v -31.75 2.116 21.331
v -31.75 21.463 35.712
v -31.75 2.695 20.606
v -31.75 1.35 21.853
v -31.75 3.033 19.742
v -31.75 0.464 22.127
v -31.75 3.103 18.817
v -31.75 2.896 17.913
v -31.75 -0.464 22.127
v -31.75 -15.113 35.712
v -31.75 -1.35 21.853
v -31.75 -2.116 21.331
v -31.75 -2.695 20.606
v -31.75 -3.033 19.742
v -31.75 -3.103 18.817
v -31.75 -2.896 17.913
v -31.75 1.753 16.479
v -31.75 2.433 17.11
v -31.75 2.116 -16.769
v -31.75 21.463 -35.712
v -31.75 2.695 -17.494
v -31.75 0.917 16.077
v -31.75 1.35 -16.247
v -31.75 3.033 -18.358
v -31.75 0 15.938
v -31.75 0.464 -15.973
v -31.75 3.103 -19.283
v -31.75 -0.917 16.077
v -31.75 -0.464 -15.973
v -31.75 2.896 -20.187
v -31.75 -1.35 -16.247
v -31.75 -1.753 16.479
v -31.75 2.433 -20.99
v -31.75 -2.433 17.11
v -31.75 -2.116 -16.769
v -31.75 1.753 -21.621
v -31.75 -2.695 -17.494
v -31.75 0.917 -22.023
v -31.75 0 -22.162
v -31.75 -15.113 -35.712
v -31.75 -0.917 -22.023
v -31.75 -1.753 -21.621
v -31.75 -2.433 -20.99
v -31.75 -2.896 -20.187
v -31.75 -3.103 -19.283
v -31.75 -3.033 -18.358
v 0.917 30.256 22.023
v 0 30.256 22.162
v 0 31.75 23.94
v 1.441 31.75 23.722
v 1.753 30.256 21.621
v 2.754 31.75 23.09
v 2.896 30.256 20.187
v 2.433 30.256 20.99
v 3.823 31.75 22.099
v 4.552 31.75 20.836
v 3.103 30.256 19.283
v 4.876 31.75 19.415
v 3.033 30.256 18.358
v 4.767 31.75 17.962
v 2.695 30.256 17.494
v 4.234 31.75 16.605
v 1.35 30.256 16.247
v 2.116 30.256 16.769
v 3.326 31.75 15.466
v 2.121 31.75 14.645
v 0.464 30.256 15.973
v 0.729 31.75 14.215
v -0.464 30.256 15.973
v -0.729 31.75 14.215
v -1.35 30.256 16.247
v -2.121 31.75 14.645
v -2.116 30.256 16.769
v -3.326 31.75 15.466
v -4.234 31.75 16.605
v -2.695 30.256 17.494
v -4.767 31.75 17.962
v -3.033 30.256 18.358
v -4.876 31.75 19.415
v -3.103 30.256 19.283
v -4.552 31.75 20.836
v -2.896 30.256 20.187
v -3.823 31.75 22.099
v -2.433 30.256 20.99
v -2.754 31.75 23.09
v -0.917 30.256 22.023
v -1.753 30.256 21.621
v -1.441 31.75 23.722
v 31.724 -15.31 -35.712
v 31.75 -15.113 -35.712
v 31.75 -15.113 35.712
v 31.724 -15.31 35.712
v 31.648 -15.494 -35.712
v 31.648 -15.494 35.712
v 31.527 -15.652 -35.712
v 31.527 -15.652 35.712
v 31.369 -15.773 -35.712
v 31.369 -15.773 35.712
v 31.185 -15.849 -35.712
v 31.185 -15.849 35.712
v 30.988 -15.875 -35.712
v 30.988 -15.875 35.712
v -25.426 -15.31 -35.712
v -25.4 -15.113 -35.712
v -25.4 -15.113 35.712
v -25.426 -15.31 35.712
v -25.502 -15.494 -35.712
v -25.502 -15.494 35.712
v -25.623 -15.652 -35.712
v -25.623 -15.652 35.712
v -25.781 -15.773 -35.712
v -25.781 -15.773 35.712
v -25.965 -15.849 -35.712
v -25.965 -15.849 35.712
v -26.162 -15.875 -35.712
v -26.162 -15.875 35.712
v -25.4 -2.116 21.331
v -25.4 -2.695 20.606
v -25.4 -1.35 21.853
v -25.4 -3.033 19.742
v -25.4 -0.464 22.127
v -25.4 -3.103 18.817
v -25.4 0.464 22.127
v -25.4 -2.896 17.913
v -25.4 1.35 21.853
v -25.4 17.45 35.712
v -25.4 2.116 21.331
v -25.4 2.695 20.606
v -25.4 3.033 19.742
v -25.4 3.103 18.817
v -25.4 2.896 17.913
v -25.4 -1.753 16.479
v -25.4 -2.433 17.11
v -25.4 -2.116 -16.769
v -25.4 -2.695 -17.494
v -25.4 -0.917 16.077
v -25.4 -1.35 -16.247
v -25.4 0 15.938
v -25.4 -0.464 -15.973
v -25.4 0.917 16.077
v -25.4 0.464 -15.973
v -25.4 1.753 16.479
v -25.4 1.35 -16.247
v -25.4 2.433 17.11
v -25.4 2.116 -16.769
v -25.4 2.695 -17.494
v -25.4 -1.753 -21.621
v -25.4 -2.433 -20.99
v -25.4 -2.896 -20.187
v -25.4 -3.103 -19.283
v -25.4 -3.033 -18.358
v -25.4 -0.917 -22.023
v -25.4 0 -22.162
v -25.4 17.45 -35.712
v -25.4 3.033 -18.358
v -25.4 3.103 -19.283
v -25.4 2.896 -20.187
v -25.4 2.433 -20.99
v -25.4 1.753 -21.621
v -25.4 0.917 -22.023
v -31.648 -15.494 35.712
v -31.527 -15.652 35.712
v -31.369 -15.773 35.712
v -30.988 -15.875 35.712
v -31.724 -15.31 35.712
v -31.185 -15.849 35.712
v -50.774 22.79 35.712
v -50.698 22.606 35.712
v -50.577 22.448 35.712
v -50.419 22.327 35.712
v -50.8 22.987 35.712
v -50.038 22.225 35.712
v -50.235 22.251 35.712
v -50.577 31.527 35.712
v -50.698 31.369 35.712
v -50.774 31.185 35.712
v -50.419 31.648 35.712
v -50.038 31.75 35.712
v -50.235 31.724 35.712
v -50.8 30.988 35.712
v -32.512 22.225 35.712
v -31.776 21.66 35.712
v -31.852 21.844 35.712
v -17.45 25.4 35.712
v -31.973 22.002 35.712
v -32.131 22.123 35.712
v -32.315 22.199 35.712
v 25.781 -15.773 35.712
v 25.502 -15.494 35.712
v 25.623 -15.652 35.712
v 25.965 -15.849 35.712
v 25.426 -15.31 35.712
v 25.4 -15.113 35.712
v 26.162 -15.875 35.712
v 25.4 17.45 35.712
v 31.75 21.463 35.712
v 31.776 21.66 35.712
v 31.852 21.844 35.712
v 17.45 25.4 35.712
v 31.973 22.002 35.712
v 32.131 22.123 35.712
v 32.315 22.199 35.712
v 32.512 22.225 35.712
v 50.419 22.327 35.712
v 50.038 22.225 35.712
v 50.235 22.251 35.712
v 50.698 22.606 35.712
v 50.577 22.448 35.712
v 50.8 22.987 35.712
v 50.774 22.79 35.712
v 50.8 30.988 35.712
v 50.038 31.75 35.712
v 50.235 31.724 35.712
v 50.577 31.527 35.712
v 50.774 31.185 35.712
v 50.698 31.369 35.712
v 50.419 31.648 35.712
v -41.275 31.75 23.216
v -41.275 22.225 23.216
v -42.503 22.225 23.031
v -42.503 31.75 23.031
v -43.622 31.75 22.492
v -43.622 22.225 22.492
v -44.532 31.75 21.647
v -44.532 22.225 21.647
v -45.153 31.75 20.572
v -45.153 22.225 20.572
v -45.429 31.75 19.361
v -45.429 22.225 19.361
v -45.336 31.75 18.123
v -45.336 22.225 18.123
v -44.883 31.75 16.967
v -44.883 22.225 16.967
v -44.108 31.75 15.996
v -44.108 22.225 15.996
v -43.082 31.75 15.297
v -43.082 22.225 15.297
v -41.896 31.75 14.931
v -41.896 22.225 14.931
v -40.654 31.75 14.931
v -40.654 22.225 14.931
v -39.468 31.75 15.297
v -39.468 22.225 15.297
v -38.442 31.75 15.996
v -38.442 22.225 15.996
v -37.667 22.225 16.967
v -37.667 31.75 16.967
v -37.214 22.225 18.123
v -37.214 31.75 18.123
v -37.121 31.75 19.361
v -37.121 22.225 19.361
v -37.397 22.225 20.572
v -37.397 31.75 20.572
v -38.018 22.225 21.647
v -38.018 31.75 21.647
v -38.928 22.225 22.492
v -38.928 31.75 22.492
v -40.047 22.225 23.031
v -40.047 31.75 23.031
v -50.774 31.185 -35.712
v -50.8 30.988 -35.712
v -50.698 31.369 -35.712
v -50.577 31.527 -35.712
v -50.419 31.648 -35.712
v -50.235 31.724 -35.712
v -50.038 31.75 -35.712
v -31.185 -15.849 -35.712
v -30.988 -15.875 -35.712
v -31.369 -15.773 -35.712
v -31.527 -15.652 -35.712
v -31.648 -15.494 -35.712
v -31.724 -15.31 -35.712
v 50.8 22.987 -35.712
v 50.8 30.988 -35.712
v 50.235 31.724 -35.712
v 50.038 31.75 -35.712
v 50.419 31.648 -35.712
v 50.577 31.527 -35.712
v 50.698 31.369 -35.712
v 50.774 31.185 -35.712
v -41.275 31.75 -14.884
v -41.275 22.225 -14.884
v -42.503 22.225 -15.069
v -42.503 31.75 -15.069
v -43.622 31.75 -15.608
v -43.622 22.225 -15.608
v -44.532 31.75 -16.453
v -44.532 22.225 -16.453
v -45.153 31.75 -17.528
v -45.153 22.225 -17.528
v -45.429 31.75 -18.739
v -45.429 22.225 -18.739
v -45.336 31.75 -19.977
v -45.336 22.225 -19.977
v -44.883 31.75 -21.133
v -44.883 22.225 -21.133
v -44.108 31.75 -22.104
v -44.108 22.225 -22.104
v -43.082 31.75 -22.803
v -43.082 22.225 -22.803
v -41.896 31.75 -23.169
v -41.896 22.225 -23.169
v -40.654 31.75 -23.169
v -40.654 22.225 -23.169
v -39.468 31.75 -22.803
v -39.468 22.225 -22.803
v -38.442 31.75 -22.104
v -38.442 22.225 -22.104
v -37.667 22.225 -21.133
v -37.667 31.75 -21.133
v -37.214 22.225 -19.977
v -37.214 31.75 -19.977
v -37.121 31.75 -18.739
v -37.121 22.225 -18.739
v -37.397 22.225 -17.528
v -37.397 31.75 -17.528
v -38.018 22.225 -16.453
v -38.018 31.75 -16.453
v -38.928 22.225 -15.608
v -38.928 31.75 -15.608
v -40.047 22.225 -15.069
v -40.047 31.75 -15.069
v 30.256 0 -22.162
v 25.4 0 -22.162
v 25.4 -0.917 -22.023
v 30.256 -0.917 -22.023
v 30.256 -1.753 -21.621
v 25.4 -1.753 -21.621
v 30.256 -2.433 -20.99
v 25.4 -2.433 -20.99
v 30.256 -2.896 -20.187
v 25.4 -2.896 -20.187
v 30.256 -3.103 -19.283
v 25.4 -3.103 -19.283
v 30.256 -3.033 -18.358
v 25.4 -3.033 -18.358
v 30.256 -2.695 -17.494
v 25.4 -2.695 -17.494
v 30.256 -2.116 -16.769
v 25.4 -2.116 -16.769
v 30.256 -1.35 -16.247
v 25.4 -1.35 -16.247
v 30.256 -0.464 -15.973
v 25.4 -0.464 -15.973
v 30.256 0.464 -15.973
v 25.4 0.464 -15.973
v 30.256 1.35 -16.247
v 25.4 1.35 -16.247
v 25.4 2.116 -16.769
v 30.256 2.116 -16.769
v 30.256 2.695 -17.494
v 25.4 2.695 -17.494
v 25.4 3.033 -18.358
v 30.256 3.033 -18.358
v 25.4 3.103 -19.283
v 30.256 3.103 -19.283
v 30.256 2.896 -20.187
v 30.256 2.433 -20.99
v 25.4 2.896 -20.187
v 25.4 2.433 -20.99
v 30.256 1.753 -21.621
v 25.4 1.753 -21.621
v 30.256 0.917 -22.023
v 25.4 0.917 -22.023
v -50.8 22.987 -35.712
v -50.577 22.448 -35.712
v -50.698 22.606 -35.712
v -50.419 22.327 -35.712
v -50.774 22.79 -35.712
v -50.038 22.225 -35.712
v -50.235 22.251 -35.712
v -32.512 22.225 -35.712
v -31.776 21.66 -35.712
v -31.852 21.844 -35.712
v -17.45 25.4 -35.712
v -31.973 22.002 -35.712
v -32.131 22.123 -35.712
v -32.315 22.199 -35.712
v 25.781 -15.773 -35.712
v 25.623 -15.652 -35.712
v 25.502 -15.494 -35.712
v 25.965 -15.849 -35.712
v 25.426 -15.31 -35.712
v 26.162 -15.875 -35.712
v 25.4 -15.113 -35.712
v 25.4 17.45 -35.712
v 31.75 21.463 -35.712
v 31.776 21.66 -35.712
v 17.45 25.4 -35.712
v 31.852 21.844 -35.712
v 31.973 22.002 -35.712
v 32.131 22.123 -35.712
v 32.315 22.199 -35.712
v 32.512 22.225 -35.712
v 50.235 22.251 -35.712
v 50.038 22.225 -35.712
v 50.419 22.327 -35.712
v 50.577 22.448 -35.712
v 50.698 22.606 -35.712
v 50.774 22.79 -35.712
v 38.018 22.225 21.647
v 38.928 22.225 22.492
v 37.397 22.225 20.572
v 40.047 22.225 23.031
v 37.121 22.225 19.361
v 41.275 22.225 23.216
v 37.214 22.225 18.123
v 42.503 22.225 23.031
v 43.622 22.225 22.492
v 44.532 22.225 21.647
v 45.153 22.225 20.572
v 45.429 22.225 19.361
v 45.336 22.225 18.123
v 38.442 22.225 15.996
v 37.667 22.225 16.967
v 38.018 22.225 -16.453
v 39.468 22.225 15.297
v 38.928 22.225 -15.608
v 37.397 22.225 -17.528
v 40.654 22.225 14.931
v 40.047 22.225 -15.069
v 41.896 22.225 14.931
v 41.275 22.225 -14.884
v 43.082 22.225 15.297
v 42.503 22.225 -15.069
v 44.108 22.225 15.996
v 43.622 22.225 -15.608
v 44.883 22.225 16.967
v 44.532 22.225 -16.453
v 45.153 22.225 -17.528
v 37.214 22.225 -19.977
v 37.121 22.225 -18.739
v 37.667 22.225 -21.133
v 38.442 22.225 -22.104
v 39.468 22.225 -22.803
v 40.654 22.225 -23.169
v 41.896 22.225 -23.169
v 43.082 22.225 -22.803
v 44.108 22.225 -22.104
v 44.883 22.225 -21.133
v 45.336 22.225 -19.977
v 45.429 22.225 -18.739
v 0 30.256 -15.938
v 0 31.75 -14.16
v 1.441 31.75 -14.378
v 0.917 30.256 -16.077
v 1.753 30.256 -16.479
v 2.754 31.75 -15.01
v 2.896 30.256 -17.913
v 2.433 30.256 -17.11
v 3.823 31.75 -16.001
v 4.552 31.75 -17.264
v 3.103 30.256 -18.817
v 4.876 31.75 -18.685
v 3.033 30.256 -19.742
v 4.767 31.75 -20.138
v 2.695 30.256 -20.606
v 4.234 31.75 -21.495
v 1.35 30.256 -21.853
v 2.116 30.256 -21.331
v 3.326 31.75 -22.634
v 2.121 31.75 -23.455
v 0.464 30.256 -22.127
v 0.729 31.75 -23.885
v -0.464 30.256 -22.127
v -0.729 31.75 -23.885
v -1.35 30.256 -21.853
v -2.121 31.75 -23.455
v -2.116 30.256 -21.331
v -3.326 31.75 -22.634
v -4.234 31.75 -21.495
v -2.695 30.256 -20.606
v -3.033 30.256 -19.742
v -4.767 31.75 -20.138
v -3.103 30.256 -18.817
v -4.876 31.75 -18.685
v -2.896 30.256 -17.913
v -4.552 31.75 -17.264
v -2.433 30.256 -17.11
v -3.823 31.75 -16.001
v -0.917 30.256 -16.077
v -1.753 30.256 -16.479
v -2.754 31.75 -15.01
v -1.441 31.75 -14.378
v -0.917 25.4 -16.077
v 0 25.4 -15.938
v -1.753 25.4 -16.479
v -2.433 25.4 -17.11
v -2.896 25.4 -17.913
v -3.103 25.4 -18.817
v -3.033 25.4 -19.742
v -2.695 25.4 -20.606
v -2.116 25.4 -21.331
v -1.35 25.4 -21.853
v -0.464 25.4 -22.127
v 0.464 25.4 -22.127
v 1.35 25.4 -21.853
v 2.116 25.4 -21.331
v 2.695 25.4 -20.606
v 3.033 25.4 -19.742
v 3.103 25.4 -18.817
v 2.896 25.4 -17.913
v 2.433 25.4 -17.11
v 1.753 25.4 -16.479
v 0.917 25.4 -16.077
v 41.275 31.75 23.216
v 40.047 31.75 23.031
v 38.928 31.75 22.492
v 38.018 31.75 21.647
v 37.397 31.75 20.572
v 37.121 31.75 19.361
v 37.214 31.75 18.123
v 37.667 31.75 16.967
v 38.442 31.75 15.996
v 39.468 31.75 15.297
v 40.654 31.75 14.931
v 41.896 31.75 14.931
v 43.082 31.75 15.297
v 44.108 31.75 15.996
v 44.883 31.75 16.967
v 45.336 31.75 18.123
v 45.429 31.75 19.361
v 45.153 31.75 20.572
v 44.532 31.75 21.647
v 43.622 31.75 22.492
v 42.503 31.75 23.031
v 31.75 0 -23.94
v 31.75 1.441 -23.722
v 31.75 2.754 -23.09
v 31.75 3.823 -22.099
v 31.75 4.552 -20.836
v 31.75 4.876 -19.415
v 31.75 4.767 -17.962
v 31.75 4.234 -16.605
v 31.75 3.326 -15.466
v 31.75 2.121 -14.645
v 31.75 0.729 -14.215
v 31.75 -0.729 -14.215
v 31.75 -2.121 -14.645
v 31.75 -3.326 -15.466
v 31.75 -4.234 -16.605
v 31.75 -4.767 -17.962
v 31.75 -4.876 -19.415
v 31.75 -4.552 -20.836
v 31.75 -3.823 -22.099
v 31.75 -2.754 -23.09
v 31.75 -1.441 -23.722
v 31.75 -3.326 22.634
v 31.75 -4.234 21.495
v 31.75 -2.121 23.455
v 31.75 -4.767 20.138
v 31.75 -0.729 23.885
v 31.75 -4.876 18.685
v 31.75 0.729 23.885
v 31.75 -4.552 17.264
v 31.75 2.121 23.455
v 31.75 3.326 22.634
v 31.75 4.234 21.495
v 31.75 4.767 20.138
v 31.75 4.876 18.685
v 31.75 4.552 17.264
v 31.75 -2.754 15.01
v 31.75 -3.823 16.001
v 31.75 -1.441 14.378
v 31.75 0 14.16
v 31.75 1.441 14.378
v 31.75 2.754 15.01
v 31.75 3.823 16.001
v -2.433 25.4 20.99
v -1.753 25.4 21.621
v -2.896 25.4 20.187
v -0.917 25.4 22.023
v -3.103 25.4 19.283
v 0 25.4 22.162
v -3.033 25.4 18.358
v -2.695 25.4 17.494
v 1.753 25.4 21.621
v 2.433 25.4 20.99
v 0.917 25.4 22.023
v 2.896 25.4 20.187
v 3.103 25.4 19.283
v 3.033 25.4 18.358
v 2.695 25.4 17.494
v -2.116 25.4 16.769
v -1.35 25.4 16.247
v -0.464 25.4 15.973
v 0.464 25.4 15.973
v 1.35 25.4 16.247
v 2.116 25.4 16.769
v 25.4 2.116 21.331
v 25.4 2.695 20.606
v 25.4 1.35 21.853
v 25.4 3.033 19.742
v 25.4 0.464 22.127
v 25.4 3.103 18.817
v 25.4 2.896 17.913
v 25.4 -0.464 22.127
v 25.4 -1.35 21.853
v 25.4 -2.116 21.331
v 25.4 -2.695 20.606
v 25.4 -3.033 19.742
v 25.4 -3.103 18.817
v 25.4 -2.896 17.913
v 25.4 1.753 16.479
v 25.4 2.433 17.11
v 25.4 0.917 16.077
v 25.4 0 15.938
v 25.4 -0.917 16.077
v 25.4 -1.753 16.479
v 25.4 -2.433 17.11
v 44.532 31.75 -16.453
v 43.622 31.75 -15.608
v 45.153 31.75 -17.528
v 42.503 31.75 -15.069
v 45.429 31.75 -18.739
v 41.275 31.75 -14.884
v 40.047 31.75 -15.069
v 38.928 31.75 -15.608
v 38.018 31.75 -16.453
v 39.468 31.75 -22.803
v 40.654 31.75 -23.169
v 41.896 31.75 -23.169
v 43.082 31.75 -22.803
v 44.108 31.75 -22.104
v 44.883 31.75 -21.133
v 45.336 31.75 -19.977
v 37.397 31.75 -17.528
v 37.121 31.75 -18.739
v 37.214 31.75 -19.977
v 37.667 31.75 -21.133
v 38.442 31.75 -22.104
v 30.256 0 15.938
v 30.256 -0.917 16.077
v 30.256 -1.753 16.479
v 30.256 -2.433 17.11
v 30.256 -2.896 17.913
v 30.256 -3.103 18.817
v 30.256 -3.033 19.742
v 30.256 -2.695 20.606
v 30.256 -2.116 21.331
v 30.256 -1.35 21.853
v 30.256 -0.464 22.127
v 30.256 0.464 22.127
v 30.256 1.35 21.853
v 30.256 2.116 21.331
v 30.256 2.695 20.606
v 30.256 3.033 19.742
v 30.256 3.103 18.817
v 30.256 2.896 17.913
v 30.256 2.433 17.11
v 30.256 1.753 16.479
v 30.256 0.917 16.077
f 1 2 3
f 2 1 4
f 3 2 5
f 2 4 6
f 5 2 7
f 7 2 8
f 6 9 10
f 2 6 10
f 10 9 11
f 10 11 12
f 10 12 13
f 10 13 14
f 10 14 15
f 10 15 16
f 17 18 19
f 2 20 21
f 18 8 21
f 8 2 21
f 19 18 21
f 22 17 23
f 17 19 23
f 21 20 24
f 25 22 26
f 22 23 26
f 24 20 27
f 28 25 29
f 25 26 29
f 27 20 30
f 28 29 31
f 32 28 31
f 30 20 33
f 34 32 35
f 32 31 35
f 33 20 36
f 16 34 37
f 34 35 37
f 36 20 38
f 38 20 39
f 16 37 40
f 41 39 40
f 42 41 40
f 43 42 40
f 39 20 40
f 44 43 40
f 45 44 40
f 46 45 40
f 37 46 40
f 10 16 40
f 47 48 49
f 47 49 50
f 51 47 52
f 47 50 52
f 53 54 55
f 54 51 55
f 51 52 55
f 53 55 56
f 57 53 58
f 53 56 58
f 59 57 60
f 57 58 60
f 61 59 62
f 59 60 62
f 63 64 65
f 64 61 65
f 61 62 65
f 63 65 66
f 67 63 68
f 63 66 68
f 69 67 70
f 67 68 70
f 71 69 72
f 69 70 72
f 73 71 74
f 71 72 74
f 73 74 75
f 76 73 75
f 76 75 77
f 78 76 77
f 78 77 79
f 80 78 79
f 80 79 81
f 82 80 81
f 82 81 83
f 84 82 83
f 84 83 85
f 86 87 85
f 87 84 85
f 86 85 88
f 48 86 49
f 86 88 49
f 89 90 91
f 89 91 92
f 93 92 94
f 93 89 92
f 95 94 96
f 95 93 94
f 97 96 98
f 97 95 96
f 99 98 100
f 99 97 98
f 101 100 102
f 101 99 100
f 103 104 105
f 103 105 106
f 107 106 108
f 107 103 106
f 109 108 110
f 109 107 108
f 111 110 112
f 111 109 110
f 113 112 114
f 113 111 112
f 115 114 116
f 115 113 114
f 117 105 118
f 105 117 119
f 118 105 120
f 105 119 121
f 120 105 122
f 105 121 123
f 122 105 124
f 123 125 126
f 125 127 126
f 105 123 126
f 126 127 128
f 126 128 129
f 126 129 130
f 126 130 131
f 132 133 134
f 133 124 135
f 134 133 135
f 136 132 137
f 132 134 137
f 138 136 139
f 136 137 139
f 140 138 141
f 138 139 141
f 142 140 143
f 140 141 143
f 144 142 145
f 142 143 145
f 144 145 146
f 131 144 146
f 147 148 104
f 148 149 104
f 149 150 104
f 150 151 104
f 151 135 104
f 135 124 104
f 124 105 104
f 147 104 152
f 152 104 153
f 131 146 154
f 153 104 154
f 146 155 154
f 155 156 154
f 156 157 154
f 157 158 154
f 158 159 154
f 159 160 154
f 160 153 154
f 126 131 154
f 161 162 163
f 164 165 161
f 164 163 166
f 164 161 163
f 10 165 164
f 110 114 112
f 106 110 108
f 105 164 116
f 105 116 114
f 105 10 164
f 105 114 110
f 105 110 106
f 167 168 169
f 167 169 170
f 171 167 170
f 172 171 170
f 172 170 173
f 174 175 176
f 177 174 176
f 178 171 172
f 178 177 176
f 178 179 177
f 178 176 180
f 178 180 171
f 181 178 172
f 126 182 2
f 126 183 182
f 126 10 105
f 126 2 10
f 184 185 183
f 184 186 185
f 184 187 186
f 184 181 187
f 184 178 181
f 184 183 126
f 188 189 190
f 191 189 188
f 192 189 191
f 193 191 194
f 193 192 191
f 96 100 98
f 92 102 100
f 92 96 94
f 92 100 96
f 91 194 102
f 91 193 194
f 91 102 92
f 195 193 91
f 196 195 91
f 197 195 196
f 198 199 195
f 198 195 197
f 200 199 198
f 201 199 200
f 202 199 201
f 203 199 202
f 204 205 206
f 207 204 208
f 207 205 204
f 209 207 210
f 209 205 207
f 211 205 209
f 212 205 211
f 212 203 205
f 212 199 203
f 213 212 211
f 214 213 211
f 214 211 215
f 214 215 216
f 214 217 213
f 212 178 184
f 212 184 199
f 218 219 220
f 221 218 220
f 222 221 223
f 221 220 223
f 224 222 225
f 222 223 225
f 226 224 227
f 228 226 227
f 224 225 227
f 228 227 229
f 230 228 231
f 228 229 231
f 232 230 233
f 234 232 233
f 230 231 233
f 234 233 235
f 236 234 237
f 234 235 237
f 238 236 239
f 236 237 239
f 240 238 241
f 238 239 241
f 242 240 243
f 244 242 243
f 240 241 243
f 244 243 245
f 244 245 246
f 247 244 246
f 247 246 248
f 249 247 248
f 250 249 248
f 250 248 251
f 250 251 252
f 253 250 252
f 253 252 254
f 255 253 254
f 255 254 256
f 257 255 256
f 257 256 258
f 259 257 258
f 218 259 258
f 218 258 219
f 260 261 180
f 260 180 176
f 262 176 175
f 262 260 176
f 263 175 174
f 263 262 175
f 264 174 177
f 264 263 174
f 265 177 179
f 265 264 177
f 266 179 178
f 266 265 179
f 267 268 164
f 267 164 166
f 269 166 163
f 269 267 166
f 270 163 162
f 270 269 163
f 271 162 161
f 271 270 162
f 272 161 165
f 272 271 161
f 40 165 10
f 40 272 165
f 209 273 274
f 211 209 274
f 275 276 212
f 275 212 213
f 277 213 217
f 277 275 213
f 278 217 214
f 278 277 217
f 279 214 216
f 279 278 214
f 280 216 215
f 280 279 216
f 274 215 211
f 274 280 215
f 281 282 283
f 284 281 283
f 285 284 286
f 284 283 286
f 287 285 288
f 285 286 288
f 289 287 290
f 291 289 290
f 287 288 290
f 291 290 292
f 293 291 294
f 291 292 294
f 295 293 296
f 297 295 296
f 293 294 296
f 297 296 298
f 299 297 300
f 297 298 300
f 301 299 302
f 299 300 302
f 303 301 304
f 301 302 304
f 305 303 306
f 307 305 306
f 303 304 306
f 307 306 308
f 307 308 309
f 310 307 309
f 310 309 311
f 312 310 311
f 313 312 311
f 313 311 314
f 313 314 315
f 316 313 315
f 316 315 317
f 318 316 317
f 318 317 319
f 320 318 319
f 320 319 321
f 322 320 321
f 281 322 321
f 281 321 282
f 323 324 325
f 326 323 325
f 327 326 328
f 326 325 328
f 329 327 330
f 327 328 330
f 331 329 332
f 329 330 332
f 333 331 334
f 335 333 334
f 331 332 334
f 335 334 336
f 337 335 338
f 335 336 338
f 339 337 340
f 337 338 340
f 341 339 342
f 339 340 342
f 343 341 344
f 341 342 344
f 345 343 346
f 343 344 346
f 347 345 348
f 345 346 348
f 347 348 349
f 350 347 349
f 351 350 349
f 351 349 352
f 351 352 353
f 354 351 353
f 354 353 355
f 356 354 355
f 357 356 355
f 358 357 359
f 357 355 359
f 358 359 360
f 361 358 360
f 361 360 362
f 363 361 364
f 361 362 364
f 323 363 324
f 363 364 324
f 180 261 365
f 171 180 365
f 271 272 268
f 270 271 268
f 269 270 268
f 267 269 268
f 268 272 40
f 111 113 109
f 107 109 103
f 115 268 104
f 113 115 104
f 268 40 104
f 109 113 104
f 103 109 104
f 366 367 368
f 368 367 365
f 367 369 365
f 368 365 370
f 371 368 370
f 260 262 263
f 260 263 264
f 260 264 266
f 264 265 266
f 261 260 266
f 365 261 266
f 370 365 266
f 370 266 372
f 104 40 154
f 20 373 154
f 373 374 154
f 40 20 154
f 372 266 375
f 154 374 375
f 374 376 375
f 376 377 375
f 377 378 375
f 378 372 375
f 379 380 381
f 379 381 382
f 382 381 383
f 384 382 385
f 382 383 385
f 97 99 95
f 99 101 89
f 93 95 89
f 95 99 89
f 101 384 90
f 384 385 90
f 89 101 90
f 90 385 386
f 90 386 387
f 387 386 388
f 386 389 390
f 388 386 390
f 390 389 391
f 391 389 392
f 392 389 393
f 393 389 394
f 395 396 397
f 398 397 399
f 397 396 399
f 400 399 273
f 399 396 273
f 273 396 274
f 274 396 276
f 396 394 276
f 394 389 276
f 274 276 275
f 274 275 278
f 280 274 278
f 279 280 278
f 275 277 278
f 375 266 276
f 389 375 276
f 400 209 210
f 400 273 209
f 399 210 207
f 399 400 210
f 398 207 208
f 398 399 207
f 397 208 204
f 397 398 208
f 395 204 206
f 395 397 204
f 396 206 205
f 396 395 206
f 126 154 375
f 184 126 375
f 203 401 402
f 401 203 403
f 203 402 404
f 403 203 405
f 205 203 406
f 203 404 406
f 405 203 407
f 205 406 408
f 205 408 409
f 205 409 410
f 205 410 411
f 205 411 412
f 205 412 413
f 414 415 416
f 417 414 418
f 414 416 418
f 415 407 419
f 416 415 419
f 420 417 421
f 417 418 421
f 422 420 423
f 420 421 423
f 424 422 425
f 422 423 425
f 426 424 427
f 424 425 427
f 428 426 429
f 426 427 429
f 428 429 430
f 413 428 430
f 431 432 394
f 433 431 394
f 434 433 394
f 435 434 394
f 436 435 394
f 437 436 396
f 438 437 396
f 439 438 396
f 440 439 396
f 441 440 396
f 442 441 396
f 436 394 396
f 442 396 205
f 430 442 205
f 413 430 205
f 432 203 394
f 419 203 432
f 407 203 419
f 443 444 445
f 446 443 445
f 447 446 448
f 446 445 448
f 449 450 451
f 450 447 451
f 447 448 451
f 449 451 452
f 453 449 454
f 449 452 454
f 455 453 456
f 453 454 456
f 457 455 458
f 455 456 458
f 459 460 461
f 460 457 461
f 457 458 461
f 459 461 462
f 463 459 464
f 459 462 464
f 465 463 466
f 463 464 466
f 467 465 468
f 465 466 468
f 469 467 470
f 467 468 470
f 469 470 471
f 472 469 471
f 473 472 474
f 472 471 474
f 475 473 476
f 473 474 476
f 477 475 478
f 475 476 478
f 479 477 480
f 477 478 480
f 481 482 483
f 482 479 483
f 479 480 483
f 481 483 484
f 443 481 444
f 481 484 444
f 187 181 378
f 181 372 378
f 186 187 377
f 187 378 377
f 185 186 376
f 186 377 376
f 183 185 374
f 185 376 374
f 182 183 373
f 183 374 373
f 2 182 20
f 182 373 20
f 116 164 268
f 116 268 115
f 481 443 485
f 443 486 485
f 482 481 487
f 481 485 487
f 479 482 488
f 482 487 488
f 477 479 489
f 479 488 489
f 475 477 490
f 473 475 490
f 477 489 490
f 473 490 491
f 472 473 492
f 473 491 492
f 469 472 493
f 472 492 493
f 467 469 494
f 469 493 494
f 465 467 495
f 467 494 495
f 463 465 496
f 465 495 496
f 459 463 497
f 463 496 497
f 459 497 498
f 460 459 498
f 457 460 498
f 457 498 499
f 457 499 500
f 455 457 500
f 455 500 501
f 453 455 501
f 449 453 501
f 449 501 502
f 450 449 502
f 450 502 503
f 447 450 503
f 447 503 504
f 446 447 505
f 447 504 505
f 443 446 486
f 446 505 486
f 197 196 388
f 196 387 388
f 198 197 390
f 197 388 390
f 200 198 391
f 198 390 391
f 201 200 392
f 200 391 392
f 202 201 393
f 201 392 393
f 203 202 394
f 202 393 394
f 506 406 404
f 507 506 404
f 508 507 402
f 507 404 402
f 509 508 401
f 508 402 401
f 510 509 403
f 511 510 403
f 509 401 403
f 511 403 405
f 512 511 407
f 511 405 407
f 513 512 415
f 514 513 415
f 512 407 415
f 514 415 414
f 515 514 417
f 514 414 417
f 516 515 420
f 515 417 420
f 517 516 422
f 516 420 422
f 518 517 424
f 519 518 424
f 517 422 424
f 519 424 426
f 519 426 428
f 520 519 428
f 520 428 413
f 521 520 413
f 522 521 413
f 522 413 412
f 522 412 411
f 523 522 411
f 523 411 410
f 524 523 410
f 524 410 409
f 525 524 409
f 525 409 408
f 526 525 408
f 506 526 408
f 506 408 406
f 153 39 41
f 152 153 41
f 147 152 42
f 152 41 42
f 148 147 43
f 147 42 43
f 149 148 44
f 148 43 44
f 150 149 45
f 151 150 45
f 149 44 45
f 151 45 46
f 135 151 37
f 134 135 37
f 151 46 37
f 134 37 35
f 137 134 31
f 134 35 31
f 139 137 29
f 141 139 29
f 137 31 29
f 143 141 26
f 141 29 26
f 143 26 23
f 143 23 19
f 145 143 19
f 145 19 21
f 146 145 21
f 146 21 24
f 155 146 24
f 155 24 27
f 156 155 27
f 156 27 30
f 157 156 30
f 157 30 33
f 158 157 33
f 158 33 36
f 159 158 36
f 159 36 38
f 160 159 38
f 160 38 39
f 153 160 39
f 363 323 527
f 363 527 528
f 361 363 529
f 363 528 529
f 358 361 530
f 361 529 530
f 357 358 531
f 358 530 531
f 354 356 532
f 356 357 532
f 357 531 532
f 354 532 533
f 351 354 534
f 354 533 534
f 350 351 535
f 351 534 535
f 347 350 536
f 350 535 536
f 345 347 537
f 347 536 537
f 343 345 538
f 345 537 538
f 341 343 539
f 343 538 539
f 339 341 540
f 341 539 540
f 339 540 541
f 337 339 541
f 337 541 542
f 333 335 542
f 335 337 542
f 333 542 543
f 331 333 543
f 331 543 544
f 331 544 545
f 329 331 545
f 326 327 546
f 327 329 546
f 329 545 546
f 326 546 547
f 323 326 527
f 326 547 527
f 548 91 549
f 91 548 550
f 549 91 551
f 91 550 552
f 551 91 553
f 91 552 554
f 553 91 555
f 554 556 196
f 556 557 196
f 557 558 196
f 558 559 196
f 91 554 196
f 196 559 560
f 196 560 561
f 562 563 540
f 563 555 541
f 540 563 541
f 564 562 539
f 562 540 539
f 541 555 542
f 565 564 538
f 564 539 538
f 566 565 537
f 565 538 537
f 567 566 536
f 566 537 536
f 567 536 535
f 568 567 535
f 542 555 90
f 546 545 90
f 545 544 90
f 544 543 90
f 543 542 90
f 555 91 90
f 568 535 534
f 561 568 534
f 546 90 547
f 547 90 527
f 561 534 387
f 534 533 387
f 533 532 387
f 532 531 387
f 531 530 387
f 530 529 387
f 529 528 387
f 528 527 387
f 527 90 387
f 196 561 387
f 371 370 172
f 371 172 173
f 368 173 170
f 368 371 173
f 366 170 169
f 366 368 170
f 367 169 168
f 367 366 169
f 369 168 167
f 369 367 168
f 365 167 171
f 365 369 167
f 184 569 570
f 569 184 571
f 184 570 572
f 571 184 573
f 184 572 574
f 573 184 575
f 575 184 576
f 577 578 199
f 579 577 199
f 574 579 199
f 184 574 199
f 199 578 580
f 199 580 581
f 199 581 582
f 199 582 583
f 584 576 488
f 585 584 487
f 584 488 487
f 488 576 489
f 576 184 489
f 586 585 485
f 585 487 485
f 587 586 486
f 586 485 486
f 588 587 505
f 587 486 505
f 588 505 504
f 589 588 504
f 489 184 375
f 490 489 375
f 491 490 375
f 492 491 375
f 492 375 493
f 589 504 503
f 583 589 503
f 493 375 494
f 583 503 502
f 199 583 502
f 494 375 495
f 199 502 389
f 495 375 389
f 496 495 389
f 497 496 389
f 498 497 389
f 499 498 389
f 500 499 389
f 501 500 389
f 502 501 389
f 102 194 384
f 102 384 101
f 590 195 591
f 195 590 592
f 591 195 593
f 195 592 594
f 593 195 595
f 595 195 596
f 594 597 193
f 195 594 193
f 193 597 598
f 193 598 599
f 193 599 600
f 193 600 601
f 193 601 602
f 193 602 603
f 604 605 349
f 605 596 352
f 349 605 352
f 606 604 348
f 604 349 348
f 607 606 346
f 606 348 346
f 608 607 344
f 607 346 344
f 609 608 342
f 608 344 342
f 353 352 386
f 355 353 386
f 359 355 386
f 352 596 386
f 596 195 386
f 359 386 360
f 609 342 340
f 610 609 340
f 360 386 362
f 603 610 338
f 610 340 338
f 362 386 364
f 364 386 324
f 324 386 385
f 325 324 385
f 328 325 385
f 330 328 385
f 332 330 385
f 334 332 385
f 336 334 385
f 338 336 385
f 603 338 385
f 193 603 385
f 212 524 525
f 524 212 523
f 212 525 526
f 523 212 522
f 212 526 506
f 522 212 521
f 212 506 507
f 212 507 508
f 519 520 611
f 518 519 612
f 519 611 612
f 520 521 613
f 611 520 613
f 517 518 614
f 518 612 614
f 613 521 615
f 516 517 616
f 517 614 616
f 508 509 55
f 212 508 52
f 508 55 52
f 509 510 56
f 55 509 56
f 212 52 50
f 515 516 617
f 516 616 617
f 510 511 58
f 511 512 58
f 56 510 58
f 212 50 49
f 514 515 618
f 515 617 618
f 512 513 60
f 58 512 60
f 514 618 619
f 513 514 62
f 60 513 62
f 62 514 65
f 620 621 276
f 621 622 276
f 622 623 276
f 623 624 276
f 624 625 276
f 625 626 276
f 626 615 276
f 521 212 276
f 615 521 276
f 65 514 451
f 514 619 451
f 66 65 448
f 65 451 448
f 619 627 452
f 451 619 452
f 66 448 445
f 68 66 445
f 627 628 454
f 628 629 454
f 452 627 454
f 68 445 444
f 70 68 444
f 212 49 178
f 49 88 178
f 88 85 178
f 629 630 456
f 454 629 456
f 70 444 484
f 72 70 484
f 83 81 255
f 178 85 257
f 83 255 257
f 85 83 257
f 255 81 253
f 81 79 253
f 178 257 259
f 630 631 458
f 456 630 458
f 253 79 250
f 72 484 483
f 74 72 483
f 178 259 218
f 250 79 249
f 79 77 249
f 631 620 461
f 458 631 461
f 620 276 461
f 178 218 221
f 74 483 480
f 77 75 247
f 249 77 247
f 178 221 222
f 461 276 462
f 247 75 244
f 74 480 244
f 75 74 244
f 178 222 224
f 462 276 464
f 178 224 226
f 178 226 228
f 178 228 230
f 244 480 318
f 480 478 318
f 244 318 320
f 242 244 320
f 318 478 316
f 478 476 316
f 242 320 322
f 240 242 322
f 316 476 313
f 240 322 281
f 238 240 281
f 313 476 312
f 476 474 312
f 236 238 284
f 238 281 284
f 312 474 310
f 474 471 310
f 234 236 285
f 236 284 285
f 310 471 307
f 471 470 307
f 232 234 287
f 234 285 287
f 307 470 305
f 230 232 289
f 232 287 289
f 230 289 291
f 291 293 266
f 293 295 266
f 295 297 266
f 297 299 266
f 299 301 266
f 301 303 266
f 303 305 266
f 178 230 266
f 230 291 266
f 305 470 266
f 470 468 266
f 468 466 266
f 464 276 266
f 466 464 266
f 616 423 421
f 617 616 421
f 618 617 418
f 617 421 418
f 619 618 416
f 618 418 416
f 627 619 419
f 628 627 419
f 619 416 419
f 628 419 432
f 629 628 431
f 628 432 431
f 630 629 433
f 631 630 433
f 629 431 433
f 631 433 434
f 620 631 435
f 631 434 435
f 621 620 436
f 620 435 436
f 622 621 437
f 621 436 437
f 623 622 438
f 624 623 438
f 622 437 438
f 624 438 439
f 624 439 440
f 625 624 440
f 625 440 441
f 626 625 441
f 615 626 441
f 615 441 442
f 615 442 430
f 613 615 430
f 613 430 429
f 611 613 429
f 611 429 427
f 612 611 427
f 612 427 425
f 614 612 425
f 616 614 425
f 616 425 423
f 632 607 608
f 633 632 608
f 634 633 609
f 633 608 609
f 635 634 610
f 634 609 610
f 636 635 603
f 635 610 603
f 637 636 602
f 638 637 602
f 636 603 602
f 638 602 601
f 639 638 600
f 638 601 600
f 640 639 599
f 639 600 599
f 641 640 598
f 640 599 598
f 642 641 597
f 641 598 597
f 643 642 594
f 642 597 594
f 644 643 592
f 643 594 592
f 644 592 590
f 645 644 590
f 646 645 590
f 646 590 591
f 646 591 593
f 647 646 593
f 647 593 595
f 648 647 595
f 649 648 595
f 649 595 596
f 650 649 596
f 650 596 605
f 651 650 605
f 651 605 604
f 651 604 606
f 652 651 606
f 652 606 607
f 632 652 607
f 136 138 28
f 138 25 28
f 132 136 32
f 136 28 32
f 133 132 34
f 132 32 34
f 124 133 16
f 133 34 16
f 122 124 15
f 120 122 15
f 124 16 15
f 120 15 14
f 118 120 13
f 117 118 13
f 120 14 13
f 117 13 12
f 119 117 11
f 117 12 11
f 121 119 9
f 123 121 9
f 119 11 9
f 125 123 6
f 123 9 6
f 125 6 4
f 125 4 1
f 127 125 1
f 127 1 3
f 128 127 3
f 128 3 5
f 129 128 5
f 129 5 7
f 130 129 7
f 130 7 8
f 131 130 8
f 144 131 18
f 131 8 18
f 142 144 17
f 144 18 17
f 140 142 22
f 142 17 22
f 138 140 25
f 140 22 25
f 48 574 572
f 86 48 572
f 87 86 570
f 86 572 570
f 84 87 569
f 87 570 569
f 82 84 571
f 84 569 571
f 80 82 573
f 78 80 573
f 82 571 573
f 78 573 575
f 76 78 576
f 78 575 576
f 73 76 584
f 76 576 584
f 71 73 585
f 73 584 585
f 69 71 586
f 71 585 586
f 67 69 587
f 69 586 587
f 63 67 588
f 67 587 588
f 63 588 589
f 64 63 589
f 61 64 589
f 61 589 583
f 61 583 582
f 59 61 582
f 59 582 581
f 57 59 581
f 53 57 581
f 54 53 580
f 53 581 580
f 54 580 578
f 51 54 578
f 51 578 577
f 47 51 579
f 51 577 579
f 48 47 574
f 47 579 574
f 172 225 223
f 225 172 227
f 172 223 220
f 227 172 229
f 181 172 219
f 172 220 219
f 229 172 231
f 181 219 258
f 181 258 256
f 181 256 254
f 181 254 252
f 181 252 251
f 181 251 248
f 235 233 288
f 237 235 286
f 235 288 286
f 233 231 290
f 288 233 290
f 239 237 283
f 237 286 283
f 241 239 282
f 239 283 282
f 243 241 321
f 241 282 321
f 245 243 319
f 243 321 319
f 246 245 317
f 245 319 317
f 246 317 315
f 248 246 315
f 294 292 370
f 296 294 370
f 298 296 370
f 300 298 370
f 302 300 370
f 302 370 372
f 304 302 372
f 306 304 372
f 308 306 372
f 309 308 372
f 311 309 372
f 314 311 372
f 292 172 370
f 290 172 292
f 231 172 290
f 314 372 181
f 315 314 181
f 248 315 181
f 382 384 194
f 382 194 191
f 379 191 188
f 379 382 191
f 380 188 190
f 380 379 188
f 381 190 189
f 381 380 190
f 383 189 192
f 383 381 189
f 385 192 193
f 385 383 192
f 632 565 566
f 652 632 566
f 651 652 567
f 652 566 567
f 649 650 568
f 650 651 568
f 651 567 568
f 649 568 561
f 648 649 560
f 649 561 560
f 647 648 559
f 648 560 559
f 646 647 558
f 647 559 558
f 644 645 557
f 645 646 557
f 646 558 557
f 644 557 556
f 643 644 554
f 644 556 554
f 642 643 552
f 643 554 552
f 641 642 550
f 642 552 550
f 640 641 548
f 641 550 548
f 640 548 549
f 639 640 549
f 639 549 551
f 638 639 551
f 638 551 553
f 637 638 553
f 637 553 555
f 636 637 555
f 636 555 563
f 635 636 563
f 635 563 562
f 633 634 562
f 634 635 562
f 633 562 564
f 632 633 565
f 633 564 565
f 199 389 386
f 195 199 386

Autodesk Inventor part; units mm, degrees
sketch "Sketch_1" plane through (0, 0, 0) normal (0, 0, 1) x (1, 0, 0)
  line L0 (-50.8, 30.988) -> (-50.8, 22.987)
  arc A0 (-50.8, 22.987) -> (-50.038, 22.225) centre (-50.038, 22.987) ccw
  line L1 (-50.038, 22.225) -> (-32.512, 22.225)
  arc A1 (-31.75, 21.463) -> (-32.512, 22.225) centre (-32.512, 21.463) ccw
  line L2 (-31.75, 21.463) -> (-31.75, -15.113)
  arc A2 (-31.75, -15.113) -> (-30.988, -15.875) centre (-30.988, -15.113) ccw
  line L3 (-30.988, -15.875) -> (-26.162, -15.875)
  arc A3 (-26.162, -15.875) -> (-25.4, -15.113) centre (-26.162, -15.113) ccw
  line L4 (-25.4, -15.113) -> (-25.4, 17.4498)
  line L5 (-25.4, 17.4498) -> (-17.4498, 25.4)
  line L6 (-17.4498, 25.4) -> (17.4498, 25.4)
  line L7 (17.4498, 25.4) -> (25.4, 17.4498)
  line L8 (25.4, 17.4498) -> (25.4, -15.113)
  arc A4 (25.4, -15.113) -> (26.162, -15.875) centre (26.162, -15.113) ccw
  line L9 (26.162, -15.875) -> (30.988, -15.875)
  arc A5 (30.988, -15.875) -> (31.75, -15.113) centre (30.988, -15.113) ccw
  line L10 (31.75, -15.113) -> (31.75, 21.463)
  arc A6 (32.512, 22.225) -> (31.75, 21.463) centre (32.512, 21.463) ccw
  line L11 (32.512, 22.225) -> (50.038, 22.225)
  arc A7 (50.038, 22.225) -> (50.8, 22.987) centre (50.038, 22.987) ccw
  line L12 (50.8, 22.987) -> (50.8, 30.988)
  arc A8 (50.8, 30.988) -> (50.038, 31.75) centre (50.038, 30.988) ccw
  line L13 (50.038, 31.75) -> (-50.038, 31.75)
  arc A9 (-50.038, 31.75) -> (-50.8, 30.988) centre (-50.038, 30.988) ccw
extrude "Extrusion1" add sketch "Sketch_1" along normal mid plane 71.4248
sketch "Sketch2" plane through (31.75, -15.113, 35.7124) normal (1, 0, 0) x (0, 0, -1)
  point P0 (16.6624, 15.113)
hole "Drilling 1" at (31.75, 0, 19.05) direction (-1, 0, 0) diameter 6.223 depth 63.5 countersink diameter 9.779 countersink angle 99.939
pattern_linear "Rectangular Pattern1" count 2 spacing 38.1 along (0, 0, -1) of "Drilling 1"
sketch "Sketch3" plane through (-50.038, 31.75, 35.7124) normal (0, 1, 0) x (1, 0, 0)
  point P0 (50.038, 16.6624)
hole "Drilling 2" at (0, 31.75, 19.05) direction (0, -1, 0) diameter 6.223 depth 6.35 countersink diameter 9.779 countersink angle 99.939
pattern_linear "Rectangular Pattern2" count 2 spacing 38.1 along (0, 0, -1) of "Drilling 2"
sketch "Sketch4" plane through (-50.038, 31.75, 35.7124) normal (0, 1, 0) x (1, 0, 0)
  point P0 (8.763, 16.6624)
hole "Drilling 3" at (-41.275, 31.75, 19.05) direction (0, -1, 0) diameter 8.3312 depth 9.525
pattern_linear "Rectangular Pattern3" count 2 spacing 82.55 along (1, 0, 0) count 2 spacing 38.1 along (0, 0, -1) of "Drilling 3"
ref_plane "pad1_XY" through (-25.4, 0, 19.05) normal (1, 0, 0) x (0, 0, -1)
ref_plane "pad1_YZ" through (-25.4, 0, 19.05) normal (0, 0, -1) x (0, 1, 0)
ref_plane "pad1_ZX" through (-25.4, 0, 19.05) normal (0, 1, 0) x (1, 0, 0)
ref_plane "pad2_XY" through (25.4, 0, 19.05) normal (1, 0, 0) x (0, 0, -1)
ref_plane "pad2_YZ" through (25.4, 0, 19.05) normal (0, 0, -1) x (0, 1, 0)
ref_plane "pad2_ZX" through (25.4, 0, 19.05) normal (0, 1, 0) x (1, 0, 0)
ref_plane "pad3_XY" through (0, 25.4, 19.05) normal (0, 1, 0) x (1, 0, 0)
ref_plane "pad3_YZ" through (0, 25.4, 19.05) normal (1, 0, 0) x (0, 0, -1)
ref_plane "pad3_ZX" through (0, 25.4, 19.05) normal (0, 0, -1) x (0, 1, 0)
ref_plane "s1_1_XY" through (-30.2565, 0, 19.05) normal (1, 0, 0) x (0, 0, -1)
ref_plane "s1_1_YZ" through (-30.2565, 0, 19.05) normal (0, 0, -1) x (0, 1, 0)
ref_plane "s1_1_ZX" through (-30.2565, 0, 19.05) normal (0, 1, 0) x (1, 0, 0)
ref_plane "s1_2_XY" through (-30.2565, 0, -19.05) normal (1, 0, 0) x (0, 0, -1)
ref_plane "s1_2_YZ" through (-30.2565, 0, -19.05) normal (0, 0, -1) x (0, 1, 0)
ref_plane "s1_2_ZX" through (-30.2565, 0, -19.05) normal (0, 1, 0) x (1, 0, 0)
ref_plane "s2_1_XY" through (30.2565, 0, 19.05) normal (1, 0, 0) x (0, 0, -1)
ref_plane "s2_1_YZ" through (30.2565, 0, 19.05) normal (0, 0, -1) x (0, 1, 0)
ref_plane "s2_1_ZX" through (30.2565, 0, 19.05) normal (0, 1, 0) x (1, 0, 0)
ref_plane "s2_2_XY" through (30.2565, 0, -19.05) normal (1, 0, 0) x (0, 0, -1)
ref_plane "s2_2_YZ" through (30.2565, 0, -19.05) normal (0, 0, -1) x (0, 1, 0)
ref_plane "s2_2_ZX" through (30.2565, 0, -19.05) normal (0, 1, 0) x (1, 0, 0)
ref_plane "s3_1_XY" through (0, 30.2565, 19.05) normal (0, 1, 0) x (1, 0, 0)
ref_plane "s3_1_YZ" through (0, 30.2565, 19.05) normal (1, 0, 0) x (0, 0, -1)
ref_plane "s3_1_ZX" through (0, 30.2565, 19.05) normal (0, 0, -1) x (0, 1, 0)
ref_plane "s3_2_XY" through (0, 30.2565, -19.05) normal (0, 1, 0) x (1, 0, 0)
ref_plane "s3_2_YZ" through (0, 30.2565, -19.05) normal (1, 0, 0) x (0, 0, -1)
ref_plane "s3_2_ZX" through (0, 30.2565, -19.05) normal (0, 0, -1) x (0, 1, 0)
properties part number "6835_p" material "Aluminum 6061"
